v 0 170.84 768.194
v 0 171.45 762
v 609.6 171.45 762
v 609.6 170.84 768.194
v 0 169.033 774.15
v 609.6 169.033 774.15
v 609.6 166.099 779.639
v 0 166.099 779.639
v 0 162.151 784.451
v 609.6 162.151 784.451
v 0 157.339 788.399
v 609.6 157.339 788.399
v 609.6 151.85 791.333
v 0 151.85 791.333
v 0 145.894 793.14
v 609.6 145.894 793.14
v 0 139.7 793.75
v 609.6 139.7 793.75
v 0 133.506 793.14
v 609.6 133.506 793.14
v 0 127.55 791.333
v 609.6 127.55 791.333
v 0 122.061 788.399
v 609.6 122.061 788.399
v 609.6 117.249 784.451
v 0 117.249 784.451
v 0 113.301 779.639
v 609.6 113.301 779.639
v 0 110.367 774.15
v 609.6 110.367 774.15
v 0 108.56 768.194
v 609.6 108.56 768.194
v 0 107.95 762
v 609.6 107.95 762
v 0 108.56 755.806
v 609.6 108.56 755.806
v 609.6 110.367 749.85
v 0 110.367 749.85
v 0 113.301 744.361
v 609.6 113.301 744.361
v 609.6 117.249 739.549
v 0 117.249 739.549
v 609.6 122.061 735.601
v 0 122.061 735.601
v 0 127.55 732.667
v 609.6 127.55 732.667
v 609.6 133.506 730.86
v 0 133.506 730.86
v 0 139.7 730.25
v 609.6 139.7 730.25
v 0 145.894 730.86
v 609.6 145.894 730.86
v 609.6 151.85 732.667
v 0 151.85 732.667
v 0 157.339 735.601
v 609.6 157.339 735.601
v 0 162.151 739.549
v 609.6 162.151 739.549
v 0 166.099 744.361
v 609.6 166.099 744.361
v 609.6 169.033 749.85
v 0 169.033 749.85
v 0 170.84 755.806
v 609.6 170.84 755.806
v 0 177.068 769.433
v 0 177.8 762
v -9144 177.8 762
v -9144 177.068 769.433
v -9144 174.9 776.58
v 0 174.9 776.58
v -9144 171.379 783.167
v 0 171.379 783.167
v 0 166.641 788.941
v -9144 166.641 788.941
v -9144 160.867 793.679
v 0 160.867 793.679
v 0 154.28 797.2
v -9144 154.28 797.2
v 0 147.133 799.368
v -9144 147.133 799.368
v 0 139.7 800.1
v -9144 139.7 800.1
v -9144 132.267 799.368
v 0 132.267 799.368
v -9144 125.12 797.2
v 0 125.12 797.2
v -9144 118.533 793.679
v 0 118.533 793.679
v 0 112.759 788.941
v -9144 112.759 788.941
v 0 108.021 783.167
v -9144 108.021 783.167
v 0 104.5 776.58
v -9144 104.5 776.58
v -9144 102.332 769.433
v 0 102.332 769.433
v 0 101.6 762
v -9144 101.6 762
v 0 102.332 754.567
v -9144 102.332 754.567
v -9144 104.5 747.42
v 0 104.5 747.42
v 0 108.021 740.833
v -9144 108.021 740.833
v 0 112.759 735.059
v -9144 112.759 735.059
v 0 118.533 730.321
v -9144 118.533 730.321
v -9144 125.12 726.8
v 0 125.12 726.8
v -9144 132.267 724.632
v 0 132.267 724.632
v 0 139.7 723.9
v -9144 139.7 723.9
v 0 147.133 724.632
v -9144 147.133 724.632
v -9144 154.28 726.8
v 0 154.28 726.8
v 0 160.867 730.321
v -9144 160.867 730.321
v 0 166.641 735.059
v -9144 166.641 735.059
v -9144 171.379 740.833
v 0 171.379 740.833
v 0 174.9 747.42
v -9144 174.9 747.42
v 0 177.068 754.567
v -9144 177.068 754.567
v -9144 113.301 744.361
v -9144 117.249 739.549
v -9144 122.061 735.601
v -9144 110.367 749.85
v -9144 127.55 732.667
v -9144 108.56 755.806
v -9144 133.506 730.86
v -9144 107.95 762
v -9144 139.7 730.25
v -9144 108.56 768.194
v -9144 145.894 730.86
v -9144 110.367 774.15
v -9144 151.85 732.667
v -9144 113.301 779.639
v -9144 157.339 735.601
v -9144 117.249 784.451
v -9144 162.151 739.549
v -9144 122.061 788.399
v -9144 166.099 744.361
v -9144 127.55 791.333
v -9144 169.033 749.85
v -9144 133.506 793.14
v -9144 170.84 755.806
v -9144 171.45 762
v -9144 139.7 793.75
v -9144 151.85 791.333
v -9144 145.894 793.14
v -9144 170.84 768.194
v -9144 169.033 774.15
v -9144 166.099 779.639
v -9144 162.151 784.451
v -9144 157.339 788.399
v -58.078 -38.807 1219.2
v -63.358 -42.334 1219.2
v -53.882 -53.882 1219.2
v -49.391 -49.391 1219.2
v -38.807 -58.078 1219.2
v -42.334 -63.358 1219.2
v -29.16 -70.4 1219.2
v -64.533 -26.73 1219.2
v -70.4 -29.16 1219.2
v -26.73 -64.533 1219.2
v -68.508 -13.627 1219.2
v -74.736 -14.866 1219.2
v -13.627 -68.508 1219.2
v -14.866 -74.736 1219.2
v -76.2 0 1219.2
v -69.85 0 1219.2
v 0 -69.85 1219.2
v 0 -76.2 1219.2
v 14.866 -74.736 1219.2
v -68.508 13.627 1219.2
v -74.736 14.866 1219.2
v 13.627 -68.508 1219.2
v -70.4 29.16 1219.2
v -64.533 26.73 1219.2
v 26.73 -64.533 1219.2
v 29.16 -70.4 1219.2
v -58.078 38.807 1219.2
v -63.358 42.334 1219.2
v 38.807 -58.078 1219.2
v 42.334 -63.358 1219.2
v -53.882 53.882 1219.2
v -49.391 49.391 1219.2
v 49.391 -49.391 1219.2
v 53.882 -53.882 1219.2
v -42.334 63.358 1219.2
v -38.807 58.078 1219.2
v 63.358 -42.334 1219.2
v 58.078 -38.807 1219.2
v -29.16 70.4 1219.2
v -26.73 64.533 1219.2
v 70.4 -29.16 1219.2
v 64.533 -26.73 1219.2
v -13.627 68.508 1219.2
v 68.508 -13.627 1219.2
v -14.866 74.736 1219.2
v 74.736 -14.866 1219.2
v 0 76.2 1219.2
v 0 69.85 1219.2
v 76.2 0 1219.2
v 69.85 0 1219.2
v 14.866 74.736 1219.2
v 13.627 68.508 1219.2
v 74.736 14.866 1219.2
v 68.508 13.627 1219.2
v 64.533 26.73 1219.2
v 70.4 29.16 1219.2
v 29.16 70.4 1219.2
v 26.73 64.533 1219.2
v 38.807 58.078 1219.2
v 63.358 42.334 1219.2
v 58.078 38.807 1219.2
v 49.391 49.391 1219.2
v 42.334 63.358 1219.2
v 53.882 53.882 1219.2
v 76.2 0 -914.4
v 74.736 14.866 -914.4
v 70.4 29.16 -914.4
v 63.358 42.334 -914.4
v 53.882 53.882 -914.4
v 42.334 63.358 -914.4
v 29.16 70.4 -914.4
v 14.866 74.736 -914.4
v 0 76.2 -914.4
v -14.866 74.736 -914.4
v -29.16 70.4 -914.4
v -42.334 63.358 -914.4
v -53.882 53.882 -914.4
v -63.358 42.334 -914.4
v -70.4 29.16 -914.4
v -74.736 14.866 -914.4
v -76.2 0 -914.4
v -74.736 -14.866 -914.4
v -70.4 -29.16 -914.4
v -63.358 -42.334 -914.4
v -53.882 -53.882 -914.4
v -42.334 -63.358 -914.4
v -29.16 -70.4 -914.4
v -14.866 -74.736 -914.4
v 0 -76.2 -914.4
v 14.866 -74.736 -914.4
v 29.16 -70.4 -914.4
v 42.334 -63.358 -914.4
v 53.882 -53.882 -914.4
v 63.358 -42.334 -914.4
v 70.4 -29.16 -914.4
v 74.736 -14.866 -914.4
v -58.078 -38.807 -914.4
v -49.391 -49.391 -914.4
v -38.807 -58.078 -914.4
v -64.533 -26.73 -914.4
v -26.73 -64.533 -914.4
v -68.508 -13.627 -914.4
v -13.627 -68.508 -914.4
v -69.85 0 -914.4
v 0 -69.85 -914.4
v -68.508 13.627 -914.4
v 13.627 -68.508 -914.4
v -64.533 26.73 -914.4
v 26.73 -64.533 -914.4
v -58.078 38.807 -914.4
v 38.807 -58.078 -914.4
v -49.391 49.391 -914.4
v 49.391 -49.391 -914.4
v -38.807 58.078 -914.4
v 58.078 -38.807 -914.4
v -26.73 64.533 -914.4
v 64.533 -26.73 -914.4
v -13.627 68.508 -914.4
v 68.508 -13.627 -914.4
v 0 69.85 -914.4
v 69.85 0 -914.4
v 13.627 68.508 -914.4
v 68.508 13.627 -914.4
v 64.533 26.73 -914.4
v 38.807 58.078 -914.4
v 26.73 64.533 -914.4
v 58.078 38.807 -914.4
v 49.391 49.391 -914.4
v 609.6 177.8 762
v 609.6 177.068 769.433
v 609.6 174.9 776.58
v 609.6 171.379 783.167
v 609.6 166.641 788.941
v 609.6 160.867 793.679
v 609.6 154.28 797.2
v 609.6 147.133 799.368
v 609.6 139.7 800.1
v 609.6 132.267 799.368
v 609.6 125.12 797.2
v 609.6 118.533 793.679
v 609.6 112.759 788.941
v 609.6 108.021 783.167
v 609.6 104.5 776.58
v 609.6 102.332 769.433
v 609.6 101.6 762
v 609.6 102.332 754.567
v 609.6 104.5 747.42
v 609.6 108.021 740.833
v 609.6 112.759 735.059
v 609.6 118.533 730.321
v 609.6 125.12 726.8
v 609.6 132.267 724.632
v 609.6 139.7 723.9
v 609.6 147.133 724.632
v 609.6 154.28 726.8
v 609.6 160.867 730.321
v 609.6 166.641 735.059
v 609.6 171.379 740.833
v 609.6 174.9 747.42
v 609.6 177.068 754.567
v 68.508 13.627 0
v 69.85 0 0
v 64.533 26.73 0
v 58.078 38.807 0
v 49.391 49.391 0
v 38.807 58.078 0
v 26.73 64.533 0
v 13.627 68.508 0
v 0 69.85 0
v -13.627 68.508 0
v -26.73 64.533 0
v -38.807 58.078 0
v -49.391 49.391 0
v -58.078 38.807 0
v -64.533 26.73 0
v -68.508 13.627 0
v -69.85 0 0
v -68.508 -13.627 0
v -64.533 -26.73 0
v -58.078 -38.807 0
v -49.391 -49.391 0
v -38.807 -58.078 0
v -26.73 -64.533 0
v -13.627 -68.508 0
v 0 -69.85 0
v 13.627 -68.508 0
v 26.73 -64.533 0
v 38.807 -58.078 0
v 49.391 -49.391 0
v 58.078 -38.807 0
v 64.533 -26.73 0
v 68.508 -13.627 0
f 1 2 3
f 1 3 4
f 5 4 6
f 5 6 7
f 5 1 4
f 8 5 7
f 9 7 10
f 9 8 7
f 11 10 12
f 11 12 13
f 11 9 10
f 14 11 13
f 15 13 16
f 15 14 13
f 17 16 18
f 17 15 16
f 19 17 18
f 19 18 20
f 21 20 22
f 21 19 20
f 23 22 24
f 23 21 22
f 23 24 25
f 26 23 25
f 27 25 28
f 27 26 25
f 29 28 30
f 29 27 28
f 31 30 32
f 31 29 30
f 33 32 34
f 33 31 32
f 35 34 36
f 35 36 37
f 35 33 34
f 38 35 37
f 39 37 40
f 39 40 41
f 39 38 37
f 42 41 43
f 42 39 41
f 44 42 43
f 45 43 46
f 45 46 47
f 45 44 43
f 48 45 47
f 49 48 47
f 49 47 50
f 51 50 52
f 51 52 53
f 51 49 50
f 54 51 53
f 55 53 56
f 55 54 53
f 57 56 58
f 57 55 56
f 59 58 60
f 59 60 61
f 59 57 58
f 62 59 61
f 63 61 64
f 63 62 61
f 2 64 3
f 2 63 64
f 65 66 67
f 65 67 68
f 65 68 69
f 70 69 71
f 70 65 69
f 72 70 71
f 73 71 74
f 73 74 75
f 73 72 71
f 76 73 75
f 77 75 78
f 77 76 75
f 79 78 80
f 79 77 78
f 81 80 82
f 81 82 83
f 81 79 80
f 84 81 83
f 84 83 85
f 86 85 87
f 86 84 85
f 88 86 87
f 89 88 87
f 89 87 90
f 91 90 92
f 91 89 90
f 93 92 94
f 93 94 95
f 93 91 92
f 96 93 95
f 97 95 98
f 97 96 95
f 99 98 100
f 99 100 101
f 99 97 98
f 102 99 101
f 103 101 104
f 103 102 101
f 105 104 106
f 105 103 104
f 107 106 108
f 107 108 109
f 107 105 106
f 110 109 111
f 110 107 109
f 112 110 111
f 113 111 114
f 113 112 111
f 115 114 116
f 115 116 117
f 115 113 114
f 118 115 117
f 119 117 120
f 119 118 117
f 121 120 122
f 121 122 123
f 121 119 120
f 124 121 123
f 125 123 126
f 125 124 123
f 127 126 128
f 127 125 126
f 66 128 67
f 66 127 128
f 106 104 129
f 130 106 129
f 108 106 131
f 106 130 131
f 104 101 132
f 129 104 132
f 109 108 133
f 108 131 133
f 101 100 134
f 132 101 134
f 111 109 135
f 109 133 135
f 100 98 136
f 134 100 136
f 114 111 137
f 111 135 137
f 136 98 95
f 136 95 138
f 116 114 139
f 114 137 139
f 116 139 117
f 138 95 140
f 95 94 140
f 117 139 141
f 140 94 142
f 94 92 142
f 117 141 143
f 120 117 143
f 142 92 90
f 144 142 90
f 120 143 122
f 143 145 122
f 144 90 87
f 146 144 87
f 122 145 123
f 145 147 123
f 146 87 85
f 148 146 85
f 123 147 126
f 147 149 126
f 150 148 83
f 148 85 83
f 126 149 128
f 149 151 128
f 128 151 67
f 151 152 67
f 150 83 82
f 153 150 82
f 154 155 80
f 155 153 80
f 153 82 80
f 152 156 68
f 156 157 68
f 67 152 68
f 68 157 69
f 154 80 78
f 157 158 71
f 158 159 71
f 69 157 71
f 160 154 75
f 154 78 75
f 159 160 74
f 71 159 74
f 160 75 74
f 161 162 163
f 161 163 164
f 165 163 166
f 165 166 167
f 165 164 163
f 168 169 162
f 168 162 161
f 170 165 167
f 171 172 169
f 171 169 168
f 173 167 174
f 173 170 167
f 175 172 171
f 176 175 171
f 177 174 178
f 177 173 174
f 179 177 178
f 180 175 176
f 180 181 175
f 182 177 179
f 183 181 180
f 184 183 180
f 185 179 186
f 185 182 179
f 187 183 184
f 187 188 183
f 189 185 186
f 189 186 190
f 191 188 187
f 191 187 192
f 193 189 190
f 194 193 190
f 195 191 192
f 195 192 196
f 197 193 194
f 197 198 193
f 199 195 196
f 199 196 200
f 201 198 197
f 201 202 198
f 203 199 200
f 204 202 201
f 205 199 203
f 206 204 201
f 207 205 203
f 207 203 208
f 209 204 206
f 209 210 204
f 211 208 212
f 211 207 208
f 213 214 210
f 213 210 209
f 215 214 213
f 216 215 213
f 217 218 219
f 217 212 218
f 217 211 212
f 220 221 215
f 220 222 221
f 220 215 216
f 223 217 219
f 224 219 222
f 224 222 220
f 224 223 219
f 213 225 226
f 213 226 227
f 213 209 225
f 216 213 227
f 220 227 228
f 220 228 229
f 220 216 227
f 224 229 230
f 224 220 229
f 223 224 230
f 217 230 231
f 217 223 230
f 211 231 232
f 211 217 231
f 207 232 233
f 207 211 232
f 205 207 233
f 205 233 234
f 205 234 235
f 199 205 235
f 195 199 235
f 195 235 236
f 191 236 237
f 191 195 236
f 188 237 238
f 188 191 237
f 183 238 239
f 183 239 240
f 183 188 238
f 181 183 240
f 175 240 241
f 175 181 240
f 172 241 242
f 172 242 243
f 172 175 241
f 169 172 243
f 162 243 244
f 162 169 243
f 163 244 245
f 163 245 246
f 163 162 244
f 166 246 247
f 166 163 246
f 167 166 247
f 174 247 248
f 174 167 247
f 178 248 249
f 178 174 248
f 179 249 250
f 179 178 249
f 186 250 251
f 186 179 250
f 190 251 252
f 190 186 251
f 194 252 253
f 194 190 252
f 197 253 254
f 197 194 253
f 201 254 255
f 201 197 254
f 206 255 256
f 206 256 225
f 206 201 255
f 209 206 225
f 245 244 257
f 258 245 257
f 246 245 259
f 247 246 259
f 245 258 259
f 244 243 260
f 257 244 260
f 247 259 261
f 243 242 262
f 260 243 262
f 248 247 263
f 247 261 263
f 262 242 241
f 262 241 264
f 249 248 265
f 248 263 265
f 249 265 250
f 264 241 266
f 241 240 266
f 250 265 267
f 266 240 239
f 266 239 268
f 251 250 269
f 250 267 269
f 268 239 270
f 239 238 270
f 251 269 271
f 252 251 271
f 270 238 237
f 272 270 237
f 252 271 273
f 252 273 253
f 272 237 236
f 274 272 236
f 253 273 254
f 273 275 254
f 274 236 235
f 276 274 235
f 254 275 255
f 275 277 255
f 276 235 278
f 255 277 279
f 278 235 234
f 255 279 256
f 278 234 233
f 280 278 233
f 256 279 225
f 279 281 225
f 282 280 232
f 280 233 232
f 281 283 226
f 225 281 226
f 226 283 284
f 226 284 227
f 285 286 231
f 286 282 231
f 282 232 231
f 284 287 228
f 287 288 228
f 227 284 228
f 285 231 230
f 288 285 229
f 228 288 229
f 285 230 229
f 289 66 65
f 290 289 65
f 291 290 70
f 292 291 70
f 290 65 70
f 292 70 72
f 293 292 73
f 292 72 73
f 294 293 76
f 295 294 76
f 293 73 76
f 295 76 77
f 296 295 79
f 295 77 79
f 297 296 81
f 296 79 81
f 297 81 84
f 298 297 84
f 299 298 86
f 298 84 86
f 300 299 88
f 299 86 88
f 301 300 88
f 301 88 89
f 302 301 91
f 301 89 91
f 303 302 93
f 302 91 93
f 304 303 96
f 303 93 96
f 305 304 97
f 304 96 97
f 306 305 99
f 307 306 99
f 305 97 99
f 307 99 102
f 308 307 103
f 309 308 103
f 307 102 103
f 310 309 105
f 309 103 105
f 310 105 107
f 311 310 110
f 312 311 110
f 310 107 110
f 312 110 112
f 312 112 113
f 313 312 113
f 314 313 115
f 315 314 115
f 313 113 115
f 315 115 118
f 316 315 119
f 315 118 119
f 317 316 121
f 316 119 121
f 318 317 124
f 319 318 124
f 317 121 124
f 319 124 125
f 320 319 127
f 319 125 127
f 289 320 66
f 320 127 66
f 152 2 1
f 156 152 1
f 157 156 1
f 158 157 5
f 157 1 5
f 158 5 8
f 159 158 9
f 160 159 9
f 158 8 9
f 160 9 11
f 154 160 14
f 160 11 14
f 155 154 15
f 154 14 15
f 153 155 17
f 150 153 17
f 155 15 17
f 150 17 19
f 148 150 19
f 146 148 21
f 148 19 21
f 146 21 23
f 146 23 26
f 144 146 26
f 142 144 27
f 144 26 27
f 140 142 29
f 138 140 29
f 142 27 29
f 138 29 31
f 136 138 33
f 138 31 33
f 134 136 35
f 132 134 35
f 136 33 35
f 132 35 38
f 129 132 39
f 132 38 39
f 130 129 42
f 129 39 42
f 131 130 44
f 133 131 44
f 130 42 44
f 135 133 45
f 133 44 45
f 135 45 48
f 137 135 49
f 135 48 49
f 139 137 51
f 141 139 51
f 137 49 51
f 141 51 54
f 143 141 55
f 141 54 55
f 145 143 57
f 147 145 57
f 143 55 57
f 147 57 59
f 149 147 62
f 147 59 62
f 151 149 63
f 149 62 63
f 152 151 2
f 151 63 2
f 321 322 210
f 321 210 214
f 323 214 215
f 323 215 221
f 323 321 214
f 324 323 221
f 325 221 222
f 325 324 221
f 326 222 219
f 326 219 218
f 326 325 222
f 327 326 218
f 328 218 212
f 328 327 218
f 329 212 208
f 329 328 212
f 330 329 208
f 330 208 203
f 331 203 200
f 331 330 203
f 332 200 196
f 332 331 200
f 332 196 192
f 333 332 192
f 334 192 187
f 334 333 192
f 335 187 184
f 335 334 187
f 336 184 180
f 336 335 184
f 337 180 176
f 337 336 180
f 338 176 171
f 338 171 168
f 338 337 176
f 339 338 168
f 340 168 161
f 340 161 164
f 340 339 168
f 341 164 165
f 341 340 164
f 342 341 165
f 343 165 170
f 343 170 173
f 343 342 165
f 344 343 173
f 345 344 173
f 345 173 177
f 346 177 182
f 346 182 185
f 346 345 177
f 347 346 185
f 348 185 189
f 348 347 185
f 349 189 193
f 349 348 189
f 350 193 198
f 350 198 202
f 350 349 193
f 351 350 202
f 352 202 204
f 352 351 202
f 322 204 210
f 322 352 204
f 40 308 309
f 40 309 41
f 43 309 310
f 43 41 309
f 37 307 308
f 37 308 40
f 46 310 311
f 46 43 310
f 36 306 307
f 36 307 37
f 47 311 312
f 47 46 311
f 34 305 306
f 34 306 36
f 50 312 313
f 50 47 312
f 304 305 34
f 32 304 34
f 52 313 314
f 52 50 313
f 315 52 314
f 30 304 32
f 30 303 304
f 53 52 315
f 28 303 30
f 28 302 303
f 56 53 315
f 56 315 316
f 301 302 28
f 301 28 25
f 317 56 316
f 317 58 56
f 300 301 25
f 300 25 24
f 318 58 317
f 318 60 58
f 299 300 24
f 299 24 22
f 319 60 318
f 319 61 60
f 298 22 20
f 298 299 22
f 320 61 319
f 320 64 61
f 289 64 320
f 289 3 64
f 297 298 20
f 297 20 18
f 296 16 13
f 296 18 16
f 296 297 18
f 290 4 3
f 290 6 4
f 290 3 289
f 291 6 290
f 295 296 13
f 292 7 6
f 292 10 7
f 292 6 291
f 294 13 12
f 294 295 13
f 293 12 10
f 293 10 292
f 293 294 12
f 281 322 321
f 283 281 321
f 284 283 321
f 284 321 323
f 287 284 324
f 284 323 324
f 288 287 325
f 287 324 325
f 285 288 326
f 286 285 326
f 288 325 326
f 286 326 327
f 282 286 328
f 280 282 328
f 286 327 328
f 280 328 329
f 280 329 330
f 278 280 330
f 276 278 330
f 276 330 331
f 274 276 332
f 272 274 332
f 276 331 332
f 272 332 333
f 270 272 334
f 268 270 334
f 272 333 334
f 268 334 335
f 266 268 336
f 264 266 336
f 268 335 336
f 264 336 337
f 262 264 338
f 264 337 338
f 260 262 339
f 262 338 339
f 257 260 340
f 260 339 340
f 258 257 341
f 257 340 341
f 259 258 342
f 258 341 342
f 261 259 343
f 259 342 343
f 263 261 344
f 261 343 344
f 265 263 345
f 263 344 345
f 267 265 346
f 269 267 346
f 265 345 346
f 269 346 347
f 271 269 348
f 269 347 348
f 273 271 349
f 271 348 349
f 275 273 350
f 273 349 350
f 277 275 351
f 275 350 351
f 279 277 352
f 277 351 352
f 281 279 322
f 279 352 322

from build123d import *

# Parameters (mm, degrees)
F0_R          = 76.2
F0_R_2        = 69.85
F1_DEPTH      = 1219.2
F1_DEPTH_BACK = 914.4
F2_R          = 38.1
F2_R_2        = 31.75
F3_DEPTH      = 9144
F3_DEPTH_BACK = 609.6


with BuildPart() as f1:
    # F0 (on Top) → F1 (new body, two sides)
    with BuildSketch(Plane.XY) as f1_sk:
        Circle(F0_R)
        Circle(F0_R_2, mode=Mode.SUBTRACT)
    extrude(amount=F1_DEPTH)
    extrude(f1_sk.sketch, amount=-F1_DEPTH_BACK)


with BuildPart() as f3:
    # F2 (on Right) → F3 (new body, two sides)
    with BuildSketch(Plane.YZ) as f3_sk:
        with Locations((139.7, 762)):
            Circle(F2_R)
        with Locations((139.7, 762)):
            Circle(F2_R_2, mode=Mode.SUBTRACT)
    extrude(amount=-F3_DEPTH)
    extrude(f3_sk.sketch, amount=F3_DEPTH_BACK)


solid = Compound([f1.part, f3.part])
